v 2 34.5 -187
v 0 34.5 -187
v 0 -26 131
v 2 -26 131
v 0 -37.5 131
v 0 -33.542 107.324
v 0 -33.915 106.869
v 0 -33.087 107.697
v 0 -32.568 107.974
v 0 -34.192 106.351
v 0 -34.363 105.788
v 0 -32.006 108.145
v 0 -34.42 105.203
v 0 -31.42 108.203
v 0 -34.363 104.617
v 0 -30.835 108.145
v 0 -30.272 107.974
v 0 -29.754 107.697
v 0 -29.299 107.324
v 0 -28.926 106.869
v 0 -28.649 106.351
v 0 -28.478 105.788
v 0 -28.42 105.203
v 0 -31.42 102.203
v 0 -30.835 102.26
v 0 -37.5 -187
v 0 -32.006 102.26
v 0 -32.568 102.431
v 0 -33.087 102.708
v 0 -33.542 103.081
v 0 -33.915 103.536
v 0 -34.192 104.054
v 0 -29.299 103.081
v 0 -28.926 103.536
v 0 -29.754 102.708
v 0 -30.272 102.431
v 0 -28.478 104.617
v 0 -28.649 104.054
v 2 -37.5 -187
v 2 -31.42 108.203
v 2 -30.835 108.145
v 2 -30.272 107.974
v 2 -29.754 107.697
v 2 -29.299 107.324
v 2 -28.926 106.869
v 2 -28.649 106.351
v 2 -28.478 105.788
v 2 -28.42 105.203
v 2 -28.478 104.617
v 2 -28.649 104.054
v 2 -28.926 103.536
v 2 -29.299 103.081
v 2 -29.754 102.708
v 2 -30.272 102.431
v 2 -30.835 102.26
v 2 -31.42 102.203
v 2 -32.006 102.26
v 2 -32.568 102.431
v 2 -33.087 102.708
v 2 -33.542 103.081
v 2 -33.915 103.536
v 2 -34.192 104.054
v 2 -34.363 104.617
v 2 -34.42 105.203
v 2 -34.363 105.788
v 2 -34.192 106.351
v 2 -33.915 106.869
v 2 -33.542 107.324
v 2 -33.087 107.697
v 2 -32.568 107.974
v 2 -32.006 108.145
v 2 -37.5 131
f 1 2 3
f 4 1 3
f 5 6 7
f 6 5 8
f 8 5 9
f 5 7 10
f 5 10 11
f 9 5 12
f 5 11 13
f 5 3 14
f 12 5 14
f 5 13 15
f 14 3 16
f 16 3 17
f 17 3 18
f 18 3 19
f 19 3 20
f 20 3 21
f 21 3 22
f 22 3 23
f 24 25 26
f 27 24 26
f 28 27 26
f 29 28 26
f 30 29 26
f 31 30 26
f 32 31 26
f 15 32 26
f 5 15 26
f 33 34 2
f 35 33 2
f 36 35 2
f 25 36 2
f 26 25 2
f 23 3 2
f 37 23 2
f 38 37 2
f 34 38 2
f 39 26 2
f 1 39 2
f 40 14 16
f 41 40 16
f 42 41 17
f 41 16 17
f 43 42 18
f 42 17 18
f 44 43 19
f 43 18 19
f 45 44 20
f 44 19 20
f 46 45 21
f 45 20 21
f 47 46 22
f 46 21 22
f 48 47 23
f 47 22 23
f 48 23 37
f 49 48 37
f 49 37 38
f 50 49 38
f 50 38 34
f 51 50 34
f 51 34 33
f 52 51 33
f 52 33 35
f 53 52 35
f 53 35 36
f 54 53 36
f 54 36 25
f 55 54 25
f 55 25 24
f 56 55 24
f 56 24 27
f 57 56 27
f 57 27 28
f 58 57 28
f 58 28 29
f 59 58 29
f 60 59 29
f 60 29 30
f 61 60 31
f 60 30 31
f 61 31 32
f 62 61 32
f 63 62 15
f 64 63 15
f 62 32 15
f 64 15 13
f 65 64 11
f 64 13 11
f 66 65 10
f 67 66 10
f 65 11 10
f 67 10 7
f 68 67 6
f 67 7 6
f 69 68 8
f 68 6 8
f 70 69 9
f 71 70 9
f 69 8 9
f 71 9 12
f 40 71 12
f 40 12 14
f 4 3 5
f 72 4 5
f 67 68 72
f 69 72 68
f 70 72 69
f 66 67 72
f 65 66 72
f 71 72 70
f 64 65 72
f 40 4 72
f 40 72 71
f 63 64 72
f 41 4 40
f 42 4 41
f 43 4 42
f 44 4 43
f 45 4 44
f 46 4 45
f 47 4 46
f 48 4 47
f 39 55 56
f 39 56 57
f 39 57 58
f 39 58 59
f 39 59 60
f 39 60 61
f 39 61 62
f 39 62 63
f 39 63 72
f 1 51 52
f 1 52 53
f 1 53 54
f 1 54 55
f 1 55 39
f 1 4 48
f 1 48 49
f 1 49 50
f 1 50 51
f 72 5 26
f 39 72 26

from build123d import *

# Parameters (mm, degrees)
RESSALTO_EXTRUS_O1_DEPTH                       = 2
BROCA_DE_ROSQUEAR_DE_CANO_PARA_TARRAXA_D_D     = 6
BROCA_DE_ROSQUEAR_DE_CANO_PARA_TARRAXA_D_DEPTH = 4
BROCA_DE_ROSQUEAR_DE_CANO_PARA_TARRAXA_D_TIP   = 1.802581857


with BuildPart() as part:
    # Esboço1 → Ressalto-extrusão1 (new body)
    with BuildSketch(Plane(origin=(0, 0, 0), x_dir=(0, 0, -1), z_dir=(1, 0, 0))):
        Polygon((-131, -26), (-131, -37.5), (187, -37.5), (187, 34.5), align=None)
    extrude(amount=RESSALTO_EXTRUS_O1_DEPTH)

    # Broca de rosquear de cano para tarraxa de 1/810
    with Locations(Plane(origin=(2, 0, 0), x_dir=(0, 0, -1), z_dir=(1, 0, 0))):
        with Locations((-105.202549234, -31.420254628)):
            Hole(BROCA_DE_ROSQUEAR_DE_CANO_PARA_TARRAXA_D_D / 2, depth=BROCA_DE_ROSQUEAR_DE_CANO_PARA_TARRAXA_D_DEPTH)
            with Locations((0, 0, -(BROCA_DE_ROSQUEAR_DE_CANO_PARA_TARRAXA_D_DEPTH + BROCA_DE_ROSQUEAR_DE_CANO_PARA_TARRAXA_D_TIP / 2))):  # 118° drill point
                Cone(0, BROCA_DE_ROSQUEAR_DE_CANO_PARA_TARRAXA_D_D / 2, BROCA_DE_ROSQUEAR_DE_CANO_PARA_TARRAXA_D_TIP, mode=Mode.SUBTRACT)


solid = part.part
